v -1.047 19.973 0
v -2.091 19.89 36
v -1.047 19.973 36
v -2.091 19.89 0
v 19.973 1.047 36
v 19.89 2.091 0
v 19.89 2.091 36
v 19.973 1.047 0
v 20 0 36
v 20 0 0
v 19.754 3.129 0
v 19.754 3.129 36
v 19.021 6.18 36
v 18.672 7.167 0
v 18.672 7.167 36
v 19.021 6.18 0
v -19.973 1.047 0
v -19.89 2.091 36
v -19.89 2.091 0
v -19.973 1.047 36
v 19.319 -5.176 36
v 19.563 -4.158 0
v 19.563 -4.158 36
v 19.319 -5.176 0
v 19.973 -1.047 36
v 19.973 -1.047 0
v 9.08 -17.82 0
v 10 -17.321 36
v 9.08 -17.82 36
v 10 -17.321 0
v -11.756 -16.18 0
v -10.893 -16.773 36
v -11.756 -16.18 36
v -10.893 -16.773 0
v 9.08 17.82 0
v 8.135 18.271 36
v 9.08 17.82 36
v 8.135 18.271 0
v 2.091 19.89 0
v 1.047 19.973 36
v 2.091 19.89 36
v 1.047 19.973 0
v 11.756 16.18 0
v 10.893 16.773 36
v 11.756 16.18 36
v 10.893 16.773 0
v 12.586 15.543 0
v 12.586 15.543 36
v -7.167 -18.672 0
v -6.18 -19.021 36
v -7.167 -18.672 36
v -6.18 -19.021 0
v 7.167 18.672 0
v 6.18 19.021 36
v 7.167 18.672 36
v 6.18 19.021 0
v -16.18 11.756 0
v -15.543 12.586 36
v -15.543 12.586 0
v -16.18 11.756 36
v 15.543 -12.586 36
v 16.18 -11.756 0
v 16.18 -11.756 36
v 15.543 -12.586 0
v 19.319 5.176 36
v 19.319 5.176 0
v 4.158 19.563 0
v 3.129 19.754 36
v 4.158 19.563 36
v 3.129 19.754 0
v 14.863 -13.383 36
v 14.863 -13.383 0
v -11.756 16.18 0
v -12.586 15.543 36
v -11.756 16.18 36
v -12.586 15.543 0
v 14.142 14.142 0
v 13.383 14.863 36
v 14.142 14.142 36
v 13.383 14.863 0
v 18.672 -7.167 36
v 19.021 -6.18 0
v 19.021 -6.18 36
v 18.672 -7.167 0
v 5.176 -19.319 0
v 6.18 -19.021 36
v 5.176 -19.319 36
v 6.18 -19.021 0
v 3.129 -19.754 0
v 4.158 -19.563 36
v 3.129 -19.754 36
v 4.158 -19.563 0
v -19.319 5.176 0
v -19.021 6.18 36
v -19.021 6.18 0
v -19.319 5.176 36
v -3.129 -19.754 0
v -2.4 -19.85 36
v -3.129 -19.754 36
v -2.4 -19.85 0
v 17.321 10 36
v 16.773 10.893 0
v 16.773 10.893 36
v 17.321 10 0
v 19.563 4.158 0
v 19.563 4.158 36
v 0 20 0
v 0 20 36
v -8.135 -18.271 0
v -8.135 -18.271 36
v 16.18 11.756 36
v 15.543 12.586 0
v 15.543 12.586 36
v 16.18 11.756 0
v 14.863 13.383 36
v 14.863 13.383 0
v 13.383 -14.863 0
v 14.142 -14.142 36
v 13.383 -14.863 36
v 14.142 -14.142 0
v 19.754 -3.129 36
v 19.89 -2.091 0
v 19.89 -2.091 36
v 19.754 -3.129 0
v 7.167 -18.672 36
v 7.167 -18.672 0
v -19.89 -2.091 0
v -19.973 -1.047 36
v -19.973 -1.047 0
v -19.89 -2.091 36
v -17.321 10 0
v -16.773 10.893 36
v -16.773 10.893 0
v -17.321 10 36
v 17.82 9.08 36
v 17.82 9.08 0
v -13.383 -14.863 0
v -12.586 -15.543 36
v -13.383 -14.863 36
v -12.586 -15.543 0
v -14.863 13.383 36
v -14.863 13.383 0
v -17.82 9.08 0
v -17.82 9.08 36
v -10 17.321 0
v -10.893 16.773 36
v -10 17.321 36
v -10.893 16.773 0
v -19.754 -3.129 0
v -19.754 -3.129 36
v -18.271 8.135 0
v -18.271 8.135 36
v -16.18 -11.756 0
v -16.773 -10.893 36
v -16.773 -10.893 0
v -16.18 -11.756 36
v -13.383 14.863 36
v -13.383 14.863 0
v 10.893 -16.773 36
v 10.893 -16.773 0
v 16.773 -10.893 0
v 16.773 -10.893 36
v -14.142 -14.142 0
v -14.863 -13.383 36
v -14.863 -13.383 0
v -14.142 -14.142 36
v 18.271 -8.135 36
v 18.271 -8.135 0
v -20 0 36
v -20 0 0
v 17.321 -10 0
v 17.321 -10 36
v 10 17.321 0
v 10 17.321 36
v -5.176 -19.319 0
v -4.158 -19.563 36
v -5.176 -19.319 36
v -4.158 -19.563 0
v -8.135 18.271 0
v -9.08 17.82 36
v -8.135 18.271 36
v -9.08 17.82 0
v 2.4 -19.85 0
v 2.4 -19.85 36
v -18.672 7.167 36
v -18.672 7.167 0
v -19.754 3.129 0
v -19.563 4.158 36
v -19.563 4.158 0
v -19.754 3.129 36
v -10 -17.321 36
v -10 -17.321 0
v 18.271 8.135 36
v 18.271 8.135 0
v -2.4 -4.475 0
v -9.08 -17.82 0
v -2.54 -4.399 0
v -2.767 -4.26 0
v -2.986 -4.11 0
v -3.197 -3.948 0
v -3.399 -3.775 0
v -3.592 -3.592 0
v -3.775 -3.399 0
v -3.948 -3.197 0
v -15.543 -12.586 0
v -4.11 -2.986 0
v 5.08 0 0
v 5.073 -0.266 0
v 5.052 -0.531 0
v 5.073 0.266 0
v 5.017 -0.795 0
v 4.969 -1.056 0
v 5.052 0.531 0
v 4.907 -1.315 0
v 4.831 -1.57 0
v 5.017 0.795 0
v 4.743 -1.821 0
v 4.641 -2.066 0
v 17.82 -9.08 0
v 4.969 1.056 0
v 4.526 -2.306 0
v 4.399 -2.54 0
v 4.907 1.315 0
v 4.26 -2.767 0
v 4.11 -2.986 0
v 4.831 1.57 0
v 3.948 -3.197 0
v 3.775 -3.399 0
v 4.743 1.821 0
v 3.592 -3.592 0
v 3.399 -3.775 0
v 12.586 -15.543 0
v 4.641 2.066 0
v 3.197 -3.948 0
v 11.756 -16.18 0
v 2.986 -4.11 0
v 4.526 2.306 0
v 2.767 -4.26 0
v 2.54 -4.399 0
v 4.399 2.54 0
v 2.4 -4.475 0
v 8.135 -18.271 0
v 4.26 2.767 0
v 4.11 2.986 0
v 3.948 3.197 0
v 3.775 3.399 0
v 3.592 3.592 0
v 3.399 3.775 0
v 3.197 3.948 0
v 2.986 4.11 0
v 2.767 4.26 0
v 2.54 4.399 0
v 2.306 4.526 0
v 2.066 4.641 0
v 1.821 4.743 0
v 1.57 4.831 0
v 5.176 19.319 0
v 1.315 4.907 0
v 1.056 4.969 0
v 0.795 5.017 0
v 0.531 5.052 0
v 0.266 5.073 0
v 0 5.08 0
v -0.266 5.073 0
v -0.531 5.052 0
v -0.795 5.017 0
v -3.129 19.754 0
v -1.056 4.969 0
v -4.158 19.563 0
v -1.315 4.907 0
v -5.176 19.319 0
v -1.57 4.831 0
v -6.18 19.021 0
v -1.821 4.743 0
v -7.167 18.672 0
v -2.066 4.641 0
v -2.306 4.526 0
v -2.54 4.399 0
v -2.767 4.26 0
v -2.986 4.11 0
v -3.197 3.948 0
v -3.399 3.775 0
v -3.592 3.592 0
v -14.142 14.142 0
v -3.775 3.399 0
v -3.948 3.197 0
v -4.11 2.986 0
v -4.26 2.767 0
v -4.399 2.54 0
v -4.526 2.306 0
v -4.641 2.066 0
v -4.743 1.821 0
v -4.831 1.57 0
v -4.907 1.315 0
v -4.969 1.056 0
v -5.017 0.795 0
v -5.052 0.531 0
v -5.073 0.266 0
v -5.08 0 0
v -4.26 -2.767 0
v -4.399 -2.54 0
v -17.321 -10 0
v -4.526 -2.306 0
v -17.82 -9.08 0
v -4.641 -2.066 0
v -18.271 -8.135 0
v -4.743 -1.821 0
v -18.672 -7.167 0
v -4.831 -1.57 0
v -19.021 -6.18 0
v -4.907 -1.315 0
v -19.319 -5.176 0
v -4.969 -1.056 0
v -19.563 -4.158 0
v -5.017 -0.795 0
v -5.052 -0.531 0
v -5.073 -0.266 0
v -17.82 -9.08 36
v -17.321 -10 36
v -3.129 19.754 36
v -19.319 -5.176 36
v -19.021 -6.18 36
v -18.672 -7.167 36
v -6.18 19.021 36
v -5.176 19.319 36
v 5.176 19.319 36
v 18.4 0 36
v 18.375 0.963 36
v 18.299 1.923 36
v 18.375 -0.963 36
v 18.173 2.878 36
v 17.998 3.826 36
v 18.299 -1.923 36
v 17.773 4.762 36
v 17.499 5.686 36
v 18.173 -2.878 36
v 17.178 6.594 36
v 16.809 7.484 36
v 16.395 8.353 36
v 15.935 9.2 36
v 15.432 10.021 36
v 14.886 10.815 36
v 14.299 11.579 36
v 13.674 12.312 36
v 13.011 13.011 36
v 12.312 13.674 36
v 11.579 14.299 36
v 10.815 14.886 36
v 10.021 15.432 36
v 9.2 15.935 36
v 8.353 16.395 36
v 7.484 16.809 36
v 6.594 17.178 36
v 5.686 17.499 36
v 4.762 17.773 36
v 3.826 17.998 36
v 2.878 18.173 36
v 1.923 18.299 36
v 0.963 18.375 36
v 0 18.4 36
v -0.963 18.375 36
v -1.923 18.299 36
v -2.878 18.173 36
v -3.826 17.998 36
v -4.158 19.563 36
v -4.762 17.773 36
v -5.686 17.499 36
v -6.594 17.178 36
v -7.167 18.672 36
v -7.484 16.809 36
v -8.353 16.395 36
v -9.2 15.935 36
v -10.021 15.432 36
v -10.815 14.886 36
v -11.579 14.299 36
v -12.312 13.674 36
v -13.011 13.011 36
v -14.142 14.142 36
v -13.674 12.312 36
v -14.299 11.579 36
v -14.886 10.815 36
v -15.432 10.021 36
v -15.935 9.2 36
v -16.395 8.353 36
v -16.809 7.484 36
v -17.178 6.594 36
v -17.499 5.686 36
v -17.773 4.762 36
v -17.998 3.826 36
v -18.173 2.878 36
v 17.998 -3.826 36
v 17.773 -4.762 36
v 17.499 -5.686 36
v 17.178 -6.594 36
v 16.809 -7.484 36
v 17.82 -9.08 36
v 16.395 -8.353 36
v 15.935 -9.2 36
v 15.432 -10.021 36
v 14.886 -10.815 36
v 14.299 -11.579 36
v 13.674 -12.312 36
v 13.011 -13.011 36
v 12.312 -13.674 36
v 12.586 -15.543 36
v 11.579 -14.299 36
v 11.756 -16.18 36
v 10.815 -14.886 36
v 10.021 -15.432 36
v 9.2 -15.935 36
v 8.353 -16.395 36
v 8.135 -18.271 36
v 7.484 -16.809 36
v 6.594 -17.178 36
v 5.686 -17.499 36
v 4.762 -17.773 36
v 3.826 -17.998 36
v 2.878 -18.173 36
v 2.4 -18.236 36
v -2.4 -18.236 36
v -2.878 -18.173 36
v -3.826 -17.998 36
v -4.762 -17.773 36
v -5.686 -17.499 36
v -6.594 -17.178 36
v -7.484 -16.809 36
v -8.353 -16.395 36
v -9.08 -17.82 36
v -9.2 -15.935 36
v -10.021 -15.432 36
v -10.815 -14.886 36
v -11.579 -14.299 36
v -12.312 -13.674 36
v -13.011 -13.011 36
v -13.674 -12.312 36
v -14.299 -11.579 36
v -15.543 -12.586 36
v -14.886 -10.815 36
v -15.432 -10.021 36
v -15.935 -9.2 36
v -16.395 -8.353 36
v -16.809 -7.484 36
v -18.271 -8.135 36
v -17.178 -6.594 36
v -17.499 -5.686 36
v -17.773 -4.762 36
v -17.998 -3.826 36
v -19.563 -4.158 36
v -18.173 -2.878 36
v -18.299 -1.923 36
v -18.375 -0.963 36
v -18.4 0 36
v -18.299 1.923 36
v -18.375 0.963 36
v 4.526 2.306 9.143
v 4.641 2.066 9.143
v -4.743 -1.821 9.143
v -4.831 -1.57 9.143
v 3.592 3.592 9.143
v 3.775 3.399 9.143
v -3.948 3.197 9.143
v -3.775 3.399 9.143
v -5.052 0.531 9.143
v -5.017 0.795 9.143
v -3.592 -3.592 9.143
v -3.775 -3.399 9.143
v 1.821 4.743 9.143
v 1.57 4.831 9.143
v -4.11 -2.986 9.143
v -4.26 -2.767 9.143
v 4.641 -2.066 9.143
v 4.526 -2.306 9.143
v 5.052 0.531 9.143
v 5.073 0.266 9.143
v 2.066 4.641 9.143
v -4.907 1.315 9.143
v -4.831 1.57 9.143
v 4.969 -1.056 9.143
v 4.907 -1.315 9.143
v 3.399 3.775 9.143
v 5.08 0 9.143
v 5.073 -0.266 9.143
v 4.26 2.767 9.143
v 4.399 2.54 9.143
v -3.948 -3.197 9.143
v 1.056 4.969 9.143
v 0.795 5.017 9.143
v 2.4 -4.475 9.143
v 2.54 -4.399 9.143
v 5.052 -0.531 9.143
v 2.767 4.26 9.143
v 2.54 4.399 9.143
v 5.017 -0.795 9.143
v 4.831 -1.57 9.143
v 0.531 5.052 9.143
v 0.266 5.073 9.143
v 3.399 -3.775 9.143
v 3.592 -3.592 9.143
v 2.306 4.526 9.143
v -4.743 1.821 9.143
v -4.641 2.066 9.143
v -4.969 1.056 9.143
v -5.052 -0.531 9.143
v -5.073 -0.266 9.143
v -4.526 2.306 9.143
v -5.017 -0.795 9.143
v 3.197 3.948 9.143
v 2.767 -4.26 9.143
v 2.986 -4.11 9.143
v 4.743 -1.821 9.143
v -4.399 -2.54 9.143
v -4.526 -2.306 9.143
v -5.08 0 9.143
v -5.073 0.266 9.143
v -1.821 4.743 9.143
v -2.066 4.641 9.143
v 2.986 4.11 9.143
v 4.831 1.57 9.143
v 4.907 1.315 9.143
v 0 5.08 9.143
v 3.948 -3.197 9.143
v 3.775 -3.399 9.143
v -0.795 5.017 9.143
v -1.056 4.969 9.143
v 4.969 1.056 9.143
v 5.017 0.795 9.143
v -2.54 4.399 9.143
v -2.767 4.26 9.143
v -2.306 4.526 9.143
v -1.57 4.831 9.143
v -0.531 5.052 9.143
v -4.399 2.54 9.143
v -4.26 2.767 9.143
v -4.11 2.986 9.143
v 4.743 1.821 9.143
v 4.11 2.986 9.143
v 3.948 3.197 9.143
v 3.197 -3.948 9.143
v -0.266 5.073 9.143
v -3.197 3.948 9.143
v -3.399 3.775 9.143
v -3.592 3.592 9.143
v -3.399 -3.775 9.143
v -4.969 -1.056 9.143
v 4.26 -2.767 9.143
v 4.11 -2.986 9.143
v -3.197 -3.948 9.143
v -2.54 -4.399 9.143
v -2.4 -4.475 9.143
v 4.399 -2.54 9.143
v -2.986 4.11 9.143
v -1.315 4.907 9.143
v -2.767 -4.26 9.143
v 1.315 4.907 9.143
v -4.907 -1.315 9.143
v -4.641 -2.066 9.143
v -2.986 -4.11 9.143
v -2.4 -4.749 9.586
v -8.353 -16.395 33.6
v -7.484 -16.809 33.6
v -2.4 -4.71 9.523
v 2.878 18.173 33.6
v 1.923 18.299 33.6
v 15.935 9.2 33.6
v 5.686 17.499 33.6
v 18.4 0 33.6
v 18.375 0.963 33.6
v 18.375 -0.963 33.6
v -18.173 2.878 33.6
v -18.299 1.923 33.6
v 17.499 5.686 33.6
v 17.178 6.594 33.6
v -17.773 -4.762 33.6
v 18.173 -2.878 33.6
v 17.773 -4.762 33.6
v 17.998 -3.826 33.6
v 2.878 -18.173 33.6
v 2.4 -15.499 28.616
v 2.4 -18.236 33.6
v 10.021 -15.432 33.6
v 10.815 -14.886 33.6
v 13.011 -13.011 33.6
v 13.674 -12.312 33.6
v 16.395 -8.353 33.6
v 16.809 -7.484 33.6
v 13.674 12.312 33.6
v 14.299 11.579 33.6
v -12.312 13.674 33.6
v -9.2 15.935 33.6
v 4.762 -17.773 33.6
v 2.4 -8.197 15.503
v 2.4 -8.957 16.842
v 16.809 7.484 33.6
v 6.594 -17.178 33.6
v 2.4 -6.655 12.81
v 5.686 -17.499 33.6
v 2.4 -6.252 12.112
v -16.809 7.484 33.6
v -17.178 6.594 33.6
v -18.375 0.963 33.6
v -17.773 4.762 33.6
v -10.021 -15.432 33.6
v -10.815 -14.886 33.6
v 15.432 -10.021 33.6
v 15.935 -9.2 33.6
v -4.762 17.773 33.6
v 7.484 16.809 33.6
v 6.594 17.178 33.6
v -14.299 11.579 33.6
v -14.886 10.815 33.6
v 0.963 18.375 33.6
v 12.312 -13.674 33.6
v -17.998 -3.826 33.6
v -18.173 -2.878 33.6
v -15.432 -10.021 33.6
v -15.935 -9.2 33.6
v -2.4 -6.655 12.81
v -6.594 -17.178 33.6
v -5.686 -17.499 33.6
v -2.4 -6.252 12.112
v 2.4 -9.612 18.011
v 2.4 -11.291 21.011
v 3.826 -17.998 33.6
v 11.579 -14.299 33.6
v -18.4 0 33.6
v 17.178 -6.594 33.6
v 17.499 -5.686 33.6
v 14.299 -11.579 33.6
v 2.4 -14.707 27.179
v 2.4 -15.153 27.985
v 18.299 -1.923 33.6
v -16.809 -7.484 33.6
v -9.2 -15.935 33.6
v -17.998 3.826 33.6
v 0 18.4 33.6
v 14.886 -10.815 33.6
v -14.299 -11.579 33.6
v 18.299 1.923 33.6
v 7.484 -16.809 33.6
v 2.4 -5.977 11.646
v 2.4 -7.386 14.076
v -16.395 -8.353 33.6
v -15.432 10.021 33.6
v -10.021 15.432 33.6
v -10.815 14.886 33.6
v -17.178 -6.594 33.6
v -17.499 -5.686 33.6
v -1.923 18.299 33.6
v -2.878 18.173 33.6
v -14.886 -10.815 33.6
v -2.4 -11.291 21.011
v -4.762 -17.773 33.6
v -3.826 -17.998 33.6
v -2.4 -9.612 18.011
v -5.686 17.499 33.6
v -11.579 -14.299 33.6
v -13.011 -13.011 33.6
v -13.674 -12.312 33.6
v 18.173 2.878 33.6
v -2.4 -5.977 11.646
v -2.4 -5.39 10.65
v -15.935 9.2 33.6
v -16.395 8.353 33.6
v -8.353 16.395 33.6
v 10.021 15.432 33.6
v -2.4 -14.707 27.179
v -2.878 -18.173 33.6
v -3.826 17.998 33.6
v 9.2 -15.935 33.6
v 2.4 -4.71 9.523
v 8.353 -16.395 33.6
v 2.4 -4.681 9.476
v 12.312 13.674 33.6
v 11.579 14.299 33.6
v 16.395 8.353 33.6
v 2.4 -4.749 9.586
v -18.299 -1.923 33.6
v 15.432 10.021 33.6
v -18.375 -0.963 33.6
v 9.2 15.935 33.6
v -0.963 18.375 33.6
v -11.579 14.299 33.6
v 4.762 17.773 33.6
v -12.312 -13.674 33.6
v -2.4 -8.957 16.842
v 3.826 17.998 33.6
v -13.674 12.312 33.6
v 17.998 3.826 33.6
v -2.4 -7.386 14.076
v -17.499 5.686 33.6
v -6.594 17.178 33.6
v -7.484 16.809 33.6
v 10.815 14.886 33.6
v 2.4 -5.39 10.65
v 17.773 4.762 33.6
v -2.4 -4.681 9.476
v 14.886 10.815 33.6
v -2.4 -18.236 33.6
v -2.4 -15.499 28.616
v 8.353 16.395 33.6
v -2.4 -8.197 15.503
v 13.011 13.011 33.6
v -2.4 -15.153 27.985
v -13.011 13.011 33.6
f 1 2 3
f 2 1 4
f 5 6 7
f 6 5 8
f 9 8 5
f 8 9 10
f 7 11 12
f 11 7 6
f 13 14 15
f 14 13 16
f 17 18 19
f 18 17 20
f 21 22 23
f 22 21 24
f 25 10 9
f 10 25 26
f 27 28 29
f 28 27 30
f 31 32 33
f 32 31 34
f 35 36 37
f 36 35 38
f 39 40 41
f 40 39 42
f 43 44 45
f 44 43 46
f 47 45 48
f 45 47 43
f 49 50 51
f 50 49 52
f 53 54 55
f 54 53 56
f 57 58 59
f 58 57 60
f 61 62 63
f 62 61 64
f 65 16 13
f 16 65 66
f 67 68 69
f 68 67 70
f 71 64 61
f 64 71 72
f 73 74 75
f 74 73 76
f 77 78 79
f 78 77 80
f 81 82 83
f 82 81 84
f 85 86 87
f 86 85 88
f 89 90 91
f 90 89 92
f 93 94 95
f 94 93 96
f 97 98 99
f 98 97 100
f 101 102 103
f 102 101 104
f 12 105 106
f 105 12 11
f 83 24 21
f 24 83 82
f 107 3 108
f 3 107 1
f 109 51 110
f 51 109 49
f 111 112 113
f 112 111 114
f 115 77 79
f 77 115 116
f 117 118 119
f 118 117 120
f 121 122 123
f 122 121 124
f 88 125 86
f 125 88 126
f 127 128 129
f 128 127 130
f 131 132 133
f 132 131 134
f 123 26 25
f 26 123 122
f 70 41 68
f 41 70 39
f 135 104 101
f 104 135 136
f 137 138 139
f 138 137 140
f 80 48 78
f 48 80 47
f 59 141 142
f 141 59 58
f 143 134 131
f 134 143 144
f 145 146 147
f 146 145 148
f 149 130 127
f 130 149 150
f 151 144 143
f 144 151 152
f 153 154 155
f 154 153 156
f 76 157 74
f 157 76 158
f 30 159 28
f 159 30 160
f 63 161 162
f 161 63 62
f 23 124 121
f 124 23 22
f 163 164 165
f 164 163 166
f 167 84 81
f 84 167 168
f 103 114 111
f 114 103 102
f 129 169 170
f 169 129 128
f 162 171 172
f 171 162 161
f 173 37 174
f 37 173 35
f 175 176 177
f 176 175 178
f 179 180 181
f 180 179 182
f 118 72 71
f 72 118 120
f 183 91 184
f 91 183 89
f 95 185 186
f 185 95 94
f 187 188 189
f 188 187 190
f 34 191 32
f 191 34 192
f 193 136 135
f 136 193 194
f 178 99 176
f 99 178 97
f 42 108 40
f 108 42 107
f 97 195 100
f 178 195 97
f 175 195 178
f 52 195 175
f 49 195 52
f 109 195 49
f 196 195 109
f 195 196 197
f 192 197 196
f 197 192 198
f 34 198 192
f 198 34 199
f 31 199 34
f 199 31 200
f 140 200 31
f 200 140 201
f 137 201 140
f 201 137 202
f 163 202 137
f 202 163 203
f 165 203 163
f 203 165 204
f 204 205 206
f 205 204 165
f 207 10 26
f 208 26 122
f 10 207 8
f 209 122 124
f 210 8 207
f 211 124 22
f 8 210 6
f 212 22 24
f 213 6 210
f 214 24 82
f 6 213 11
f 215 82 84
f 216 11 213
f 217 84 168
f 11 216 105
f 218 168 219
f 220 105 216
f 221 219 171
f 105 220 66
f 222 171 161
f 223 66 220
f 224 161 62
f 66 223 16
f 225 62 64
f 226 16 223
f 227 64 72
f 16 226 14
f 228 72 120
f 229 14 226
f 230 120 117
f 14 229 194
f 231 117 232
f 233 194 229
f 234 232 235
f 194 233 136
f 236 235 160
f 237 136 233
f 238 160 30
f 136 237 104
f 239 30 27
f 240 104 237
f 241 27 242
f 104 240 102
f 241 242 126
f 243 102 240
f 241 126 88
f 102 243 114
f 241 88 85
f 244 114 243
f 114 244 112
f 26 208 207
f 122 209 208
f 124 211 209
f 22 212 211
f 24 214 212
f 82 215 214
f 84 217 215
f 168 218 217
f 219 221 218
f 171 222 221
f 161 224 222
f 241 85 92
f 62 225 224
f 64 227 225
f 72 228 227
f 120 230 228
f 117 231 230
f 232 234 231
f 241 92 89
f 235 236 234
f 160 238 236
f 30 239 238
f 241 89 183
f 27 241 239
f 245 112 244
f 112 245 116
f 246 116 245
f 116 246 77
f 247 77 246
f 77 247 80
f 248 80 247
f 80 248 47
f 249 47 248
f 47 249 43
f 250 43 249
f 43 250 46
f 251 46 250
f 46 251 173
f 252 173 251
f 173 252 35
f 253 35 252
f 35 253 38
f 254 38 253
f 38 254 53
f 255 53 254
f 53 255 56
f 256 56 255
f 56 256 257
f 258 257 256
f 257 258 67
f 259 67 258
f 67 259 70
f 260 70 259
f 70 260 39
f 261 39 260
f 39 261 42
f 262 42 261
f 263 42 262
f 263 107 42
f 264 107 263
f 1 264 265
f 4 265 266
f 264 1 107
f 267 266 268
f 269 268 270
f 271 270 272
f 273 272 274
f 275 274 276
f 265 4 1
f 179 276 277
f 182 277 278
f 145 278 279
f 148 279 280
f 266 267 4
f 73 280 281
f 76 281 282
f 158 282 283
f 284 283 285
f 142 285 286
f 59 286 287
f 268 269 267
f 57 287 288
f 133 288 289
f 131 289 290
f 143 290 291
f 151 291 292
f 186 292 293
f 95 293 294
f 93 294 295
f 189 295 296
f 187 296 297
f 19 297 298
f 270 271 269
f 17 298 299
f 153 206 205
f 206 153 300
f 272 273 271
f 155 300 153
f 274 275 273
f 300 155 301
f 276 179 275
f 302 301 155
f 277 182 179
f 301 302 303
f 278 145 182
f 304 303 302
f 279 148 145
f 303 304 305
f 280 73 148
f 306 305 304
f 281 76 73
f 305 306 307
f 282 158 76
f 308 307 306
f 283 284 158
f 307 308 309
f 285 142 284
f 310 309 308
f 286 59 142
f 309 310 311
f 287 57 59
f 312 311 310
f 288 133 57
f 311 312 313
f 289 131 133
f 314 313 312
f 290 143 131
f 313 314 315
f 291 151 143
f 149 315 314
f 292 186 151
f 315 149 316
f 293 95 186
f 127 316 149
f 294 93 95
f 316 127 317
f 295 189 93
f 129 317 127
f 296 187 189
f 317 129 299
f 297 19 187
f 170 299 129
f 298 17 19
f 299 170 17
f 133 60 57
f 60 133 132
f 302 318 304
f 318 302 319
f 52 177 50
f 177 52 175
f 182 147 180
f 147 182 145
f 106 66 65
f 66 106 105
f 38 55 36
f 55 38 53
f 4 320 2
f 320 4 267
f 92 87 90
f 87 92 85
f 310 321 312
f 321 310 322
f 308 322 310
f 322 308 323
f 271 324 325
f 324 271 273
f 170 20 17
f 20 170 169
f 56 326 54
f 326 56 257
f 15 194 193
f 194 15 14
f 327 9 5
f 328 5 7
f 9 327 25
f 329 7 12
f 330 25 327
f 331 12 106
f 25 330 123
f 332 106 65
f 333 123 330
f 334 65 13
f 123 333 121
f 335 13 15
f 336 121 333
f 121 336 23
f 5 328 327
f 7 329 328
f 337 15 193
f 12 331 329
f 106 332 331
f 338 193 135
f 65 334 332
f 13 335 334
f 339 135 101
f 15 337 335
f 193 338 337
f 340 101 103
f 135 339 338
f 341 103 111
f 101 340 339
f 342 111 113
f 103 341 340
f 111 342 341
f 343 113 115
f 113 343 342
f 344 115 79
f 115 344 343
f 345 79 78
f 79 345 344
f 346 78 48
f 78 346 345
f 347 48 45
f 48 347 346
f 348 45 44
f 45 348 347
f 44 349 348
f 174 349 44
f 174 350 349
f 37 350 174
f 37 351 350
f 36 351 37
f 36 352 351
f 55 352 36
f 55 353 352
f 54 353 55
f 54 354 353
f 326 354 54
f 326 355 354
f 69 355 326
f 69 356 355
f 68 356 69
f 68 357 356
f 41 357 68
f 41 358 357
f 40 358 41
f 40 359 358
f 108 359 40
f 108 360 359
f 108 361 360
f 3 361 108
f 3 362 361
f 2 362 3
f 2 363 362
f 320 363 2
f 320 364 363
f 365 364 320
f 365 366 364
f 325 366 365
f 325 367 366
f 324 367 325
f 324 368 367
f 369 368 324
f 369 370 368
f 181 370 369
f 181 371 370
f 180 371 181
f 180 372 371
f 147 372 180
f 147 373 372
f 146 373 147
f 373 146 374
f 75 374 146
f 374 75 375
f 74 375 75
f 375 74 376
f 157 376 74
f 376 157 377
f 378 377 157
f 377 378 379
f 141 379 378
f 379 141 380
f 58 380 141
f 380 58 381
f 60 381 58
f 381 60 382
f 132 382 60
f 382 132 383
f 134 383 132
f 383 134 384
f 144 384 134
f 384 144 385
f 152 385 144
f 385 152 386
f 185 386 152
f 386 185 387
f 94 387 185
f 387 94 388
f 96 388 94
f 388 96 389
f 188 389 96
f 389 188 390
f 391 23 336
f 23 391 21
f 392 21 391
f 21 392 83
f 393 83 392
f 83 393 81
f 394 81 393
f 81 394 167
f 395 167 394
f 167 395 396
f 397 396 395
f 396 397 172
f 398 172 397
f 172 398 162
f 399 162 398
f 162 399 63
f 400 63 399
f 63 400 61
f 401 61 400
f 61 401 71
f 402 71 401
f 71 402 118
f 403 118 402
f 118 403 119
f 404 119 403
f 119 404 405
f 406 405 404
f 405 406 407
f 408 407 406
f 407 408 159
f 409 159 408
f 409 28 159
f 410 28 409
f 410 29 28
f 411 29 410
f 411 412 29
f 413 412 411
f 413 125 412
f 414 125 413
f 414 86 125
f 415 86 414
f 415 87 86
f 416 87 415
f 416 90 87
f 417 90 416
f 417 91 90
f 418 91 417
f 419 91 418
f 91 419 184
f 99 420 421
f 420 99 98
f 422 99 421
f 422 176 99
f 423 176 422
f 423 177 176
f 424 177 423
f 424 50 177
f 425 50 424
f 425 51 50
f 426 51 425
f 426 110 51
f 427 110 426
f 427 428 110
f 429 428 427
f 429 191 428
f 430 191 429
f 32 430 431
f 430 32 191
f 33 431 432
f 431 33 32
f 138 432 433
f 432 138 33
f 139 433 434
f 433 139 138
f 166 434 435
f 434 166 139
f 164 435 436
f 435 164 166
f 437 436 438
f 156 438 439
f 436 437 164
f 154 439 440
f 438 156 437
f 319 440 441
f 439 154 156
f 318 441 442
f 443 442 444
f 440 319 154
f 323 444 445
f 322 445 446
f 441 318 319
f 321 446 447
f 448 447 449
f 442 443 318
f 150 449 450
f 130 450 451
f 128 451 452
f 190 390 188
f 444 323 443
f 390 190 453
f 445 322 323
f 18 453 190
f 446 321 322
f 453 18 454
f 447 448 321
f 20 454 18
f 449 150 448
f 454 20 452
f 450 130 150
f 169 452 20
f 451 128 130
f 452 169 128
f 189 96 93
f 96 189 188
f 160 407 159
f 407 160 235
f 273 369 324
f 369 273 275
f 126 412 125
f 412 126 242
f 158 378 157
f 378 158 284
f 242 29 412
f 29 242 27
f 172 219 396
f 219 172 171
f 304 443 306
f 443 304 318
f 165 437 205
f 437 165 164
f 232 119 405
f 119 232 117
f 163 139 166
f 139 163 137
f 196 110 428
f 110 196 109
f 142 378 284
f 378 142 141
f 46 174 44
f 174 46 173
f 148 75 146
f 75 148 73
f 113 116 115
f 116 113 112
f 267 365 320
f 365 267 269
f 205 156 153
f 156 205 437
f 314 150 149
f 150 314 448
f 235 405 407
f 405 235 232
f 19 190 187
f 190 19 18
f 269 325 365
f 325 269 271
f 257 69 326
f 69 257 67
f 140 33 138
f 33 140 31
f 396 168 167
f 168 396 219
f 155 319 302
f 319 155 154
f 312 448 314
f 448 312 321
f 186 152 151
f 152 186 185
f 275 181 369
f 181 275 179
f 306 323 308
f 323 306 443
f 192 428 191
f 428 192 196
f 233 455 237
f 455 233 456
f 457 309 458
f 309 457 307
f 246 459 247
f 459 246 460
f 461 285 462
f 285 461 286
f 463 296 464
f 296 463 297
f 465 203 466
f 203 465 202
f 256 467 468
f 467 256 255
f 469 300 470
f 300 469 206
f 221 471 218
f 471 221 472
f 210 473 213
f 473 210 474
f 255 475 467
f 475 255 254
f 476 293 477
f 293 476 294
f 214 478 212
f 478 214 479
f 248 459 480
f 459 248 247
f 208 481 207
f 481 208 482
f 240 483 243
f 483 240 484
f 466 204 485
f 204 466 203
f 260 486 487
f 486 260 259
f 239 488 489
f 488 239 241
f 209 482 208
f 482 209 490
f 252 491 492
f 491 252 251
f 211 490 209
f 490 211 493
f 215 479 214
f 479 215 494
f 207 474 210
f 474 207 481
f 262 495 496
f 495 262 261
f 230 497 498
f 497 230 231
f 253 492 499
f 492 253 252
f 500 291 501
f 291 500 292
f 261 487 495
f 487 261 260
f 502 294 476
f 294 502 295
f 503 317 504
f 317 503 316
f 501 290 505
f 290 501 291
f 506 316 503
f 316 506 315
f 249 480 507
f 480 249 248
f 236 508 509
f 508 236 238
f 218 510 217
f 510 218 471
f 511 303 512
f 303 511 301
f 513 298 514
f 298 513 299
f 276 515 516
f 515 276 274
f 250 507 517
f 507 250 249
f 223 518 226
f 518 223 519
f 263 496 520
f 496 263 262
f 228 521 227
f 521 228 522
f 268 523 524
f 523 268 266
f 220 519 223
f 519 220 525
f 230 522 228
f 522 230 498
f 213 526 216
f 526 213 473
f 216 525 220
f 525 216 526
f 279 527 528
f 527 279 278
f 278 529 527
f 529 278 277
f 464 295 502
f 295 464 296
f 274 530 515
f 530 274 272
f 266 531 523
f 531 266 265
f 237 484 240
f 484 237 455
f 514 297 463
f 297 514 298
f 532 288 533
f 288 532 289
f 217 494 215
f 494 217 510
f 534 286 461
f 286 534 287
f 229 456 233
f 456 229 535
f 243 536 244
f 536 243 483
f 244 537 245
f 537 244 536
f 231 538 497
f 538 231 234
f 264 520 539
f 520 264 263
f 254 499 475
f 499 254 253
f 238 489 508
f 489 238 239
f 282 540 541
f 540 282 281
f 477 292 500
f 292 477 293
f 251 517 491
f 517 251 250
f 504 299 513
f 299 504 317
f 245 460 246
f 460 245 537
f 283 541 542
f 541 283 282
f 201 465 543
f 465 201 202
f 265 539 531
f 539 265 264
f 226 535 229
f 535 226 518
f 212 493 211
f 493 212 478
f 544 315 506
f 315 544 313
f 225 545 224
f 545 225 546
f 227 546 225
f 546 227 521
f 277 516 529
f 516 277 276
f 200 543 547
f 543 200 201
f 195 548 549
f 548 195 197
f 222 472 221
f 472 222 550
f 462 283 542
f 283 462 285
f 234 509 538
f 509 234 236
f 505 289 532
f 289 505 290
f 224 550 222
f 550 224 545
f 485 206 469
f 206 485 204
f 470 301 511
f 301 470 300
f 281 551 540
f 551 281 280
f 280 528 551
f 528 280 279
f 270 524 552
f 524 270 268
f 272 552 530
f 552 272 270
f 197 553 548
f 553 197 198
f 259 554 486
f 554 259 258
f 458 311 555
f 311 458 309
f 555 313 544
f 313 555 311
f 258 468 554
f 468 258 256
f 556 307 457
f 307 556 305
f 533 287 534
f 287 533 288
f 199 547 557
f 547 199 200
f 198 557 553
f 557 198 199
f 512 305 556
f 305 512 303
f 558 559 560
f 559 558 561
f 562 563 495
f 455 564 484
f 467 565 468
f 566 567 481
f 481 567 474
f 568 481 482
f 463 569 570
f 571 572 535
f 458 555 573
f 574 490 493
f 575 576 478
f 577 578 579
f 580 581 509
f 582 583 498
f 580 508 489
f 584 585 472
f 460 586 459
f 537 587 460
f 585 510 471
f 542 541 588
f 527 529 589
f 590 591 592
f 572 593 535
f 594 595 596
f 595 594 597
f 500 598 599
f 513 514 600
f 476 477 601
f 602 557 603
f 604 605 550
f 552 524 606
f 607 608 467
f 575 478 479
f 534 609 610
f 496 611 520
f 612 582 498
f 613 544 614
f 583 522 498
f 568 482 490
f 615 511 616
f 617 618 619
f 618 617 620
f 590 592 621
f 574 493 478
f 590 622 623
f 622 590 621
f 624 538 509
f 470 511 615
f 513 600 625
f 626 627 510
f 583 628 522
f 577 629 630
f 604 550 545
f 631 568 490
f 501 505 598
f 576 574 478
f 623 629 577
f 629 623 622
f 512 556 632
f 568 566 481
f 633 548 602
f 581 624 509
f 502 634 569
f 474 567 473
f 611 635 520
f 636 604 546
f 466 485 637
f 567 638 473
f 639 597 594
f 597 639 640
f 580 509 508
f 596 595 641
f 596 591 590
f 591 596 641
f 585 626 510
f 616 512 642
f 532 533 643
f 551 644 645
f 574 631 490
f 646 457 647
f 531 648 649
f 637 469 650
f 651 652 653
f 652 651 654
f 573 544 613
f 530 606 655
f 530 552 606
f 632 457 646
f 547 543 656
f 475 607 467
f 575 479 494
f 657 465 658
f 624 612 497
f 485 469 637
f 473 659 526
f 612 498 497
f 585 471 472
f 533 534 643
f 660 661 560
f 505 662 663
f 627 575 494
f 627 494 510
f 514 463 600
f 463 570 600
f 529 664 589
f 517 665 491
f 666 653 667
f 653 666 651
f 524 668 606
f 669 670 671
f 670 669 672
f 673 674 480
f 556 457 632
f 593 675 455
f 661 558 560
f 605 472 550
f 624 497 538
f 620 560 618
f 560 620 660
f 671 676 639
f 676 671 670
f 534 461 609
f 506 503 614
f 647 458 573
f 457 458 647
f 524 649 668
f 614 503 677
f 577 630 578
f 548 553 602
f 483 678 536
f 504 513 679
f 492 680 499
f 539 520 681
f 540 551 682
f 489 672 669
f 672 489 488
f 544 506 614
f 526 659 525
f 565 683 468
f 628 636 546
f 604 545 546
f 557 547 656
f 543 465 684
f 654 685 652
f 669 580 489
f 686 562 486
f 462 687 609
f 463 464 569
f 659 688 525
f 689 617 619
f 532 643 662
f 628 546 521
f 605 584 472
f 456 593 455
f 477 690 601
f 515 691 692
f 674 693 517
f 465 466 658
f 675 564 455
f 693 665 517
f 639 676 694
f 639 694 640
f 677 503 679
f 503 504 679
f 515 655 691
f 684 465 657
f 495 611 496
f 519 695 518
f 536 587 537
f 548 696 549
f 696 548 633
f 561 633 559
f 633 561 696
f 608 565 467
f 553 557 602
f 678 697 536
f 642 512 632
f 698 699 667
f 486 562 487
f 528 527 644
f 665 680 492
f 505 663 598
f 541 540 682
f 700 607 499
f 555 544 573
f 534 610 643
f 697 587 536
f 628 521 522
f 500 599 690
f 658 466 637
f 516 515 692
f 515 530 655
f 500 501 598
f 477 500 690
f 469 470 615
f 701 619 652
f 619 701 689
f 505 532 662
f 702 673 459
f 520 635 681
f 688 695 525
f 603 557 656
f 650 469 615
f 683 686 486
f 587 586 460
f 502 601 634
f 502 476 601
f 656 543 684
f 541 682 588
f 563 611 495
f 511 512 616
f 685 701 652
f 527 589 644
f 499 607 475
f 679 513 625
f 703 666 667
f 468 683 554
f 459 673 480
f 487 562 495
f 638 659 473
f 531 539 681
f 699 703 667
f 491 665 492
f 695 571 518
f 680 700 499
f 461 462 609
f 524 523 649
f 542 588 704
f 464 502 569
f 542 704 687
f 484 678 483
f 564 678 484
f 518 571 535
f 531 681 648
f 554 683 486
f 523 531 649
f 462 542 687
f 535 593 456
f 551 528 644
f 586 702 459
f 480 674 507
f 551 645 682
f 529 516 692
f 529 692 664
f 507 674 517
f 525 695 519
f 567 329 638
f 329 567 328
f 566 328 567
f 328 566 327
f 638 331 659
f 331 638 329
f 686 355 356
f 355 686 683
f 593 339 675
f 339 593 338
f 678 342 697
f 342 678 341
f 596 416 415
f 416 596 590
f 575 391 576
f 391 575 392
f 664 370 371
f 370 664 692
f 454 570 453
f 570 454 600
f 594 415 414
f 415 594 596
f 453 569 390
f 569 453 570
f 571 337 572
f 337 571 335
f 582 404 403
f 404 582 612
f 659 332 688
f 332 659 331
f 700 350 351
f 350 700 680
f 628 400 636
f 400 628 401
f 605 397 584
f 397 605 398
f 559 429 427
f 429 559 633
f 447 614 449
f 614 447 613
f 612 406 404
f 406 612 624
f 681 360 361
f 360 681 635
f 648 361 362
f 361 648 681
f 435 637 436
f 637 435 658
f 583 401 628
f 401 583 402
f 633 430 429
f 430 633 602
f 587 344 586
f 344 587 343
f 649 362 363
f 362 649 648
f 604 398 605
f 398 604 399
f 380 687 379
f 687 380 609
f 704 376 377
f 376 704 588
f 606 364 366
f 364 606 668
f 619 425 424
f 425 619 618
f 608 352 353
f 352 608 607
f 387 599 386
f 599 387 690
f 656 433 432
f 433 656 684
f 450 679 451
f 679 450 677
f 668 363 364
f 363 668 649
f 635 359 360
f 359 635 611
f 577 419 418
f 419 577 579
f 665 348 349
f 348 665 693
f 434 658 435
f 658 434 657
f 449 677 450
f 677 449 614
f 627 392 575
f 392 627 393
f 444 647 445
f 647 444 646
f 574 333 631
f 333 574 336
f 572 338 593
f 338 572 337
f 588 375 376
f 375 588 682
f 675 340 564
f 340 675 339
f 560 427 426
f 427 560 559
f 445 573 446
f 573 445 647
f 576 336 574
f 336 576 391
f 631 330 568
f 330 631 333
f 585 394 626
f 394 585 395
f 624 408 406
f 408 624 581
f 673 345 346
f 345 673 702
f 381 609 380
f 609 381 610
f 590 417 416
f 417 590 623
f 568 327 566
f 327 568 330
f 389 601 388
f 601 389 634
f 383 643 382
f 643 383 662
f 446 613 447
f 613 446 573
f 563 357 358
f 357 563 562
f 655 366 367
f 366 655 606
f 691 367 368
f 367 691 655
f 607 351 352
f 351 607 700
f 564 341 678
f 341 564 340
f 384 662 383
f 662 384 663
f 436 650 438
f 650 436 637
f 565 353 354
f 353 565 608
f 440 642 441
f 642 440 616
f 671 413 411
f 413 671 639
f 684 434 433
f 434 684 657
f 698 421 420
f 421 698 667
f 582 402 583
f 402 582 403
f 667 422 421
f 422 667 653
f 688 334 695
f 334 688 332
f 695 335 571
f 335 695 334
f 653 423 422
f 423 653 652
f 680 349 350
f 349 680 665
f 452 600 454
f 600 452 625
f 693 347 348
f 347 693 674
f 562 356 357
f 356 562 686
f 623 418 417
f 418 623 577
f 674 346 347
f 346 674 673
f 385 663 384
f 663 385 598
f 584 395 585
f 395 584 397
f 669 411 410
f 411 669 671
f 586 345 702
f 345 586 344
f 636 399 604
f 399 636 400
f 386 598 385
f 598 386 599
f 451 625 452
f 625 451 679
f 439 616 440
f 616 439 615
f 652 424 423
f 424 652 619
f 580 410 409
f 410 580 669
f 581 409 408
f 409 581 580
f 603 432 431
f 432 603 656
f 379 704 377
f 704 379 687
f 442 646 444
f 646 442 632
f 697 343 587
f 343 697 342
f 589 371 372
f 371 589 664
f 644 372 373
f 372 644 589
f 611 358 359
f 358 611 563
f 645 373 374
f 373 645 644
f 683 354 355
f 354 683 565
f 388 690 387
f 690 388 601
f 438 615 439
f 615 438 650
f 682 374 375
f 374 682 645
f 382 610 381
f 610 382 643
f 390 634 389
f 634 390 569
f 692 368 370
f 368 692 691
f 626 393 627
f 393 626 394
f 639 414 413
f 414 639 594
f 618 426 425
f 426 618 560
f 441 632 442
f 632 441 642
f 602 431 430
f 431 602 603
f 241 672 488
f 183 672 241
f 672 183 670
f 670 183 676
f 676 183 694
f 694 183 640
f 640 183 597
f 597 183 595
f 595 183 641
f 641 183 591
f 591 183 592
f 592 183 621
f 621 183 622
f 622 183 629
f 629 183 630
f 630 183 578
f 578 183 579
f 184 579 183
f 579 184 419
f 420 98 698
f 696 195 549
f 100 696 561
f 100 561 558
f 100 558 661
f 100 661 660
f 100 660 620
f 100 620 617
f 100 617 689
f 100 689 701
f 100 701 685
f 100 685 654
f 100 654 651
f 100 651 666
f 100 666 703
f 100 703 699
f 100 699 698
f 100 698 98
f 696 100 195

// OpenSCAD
// printer parameters
d_nozzle = 0.8;
h_layer = 0.6;

// TODO: needs to be refactored to use include statement https://github.com/openscad/openscad/issues/605#issuecomment-32962394

// design parameters
scale_factor = 0.2;

d_raft = 200*scale_factor;
h_raft = 180*scale_factor;

t_wall = d_nozzle;
t_wall_clearance = d_nozzle;
t_vert_wall = 4*h_layer;

//h_wicking_chamber = 55*scale_factor;
d_wicking_chamber = 50.8;
d_drainpipe = d_wicking_chamber*scale_factor;
overhang_angle = 60;

// Hidden variables:
$fn=120;

module conical_cavity() {
    translate([0, 0, -tan(overhang_angle)*(d_raft/2-t_wall-d_drainpipe/2)])
    // cone
    cylinder(r1=d_drainpipe/2, r2=d_raft/2-2*t_wall, h=tan(overhang_angle)*(d_raft/2-t_wall-d_drainpipe/2));

}

module donut() {
    difference() {
        cylinder(r=d_raft/2, h=h_raft);
        cylinder(r=d_drainpipe/2, h=h_raft);
    }
}

difference() {
    donut();
    
    // conical cavity
    translate([0, 0, h_raft-t_vert_wall])
    conical_cavity();

    // cylinder
    translate([0, 0, h_raft-t_vert_wall])
    cylinder(h=t_vert_wall, r=d_raft/2-2*t_wall);

    // keyhole for vasemode printing
    keyhole_clearance = 4*t_wall+2*t_wall_clearance;
    translate([-keyhole_clearance/2, -d_raft/2, 0])
    cube([keyhole_clearance, d_raft/2, h_raft]);
}
